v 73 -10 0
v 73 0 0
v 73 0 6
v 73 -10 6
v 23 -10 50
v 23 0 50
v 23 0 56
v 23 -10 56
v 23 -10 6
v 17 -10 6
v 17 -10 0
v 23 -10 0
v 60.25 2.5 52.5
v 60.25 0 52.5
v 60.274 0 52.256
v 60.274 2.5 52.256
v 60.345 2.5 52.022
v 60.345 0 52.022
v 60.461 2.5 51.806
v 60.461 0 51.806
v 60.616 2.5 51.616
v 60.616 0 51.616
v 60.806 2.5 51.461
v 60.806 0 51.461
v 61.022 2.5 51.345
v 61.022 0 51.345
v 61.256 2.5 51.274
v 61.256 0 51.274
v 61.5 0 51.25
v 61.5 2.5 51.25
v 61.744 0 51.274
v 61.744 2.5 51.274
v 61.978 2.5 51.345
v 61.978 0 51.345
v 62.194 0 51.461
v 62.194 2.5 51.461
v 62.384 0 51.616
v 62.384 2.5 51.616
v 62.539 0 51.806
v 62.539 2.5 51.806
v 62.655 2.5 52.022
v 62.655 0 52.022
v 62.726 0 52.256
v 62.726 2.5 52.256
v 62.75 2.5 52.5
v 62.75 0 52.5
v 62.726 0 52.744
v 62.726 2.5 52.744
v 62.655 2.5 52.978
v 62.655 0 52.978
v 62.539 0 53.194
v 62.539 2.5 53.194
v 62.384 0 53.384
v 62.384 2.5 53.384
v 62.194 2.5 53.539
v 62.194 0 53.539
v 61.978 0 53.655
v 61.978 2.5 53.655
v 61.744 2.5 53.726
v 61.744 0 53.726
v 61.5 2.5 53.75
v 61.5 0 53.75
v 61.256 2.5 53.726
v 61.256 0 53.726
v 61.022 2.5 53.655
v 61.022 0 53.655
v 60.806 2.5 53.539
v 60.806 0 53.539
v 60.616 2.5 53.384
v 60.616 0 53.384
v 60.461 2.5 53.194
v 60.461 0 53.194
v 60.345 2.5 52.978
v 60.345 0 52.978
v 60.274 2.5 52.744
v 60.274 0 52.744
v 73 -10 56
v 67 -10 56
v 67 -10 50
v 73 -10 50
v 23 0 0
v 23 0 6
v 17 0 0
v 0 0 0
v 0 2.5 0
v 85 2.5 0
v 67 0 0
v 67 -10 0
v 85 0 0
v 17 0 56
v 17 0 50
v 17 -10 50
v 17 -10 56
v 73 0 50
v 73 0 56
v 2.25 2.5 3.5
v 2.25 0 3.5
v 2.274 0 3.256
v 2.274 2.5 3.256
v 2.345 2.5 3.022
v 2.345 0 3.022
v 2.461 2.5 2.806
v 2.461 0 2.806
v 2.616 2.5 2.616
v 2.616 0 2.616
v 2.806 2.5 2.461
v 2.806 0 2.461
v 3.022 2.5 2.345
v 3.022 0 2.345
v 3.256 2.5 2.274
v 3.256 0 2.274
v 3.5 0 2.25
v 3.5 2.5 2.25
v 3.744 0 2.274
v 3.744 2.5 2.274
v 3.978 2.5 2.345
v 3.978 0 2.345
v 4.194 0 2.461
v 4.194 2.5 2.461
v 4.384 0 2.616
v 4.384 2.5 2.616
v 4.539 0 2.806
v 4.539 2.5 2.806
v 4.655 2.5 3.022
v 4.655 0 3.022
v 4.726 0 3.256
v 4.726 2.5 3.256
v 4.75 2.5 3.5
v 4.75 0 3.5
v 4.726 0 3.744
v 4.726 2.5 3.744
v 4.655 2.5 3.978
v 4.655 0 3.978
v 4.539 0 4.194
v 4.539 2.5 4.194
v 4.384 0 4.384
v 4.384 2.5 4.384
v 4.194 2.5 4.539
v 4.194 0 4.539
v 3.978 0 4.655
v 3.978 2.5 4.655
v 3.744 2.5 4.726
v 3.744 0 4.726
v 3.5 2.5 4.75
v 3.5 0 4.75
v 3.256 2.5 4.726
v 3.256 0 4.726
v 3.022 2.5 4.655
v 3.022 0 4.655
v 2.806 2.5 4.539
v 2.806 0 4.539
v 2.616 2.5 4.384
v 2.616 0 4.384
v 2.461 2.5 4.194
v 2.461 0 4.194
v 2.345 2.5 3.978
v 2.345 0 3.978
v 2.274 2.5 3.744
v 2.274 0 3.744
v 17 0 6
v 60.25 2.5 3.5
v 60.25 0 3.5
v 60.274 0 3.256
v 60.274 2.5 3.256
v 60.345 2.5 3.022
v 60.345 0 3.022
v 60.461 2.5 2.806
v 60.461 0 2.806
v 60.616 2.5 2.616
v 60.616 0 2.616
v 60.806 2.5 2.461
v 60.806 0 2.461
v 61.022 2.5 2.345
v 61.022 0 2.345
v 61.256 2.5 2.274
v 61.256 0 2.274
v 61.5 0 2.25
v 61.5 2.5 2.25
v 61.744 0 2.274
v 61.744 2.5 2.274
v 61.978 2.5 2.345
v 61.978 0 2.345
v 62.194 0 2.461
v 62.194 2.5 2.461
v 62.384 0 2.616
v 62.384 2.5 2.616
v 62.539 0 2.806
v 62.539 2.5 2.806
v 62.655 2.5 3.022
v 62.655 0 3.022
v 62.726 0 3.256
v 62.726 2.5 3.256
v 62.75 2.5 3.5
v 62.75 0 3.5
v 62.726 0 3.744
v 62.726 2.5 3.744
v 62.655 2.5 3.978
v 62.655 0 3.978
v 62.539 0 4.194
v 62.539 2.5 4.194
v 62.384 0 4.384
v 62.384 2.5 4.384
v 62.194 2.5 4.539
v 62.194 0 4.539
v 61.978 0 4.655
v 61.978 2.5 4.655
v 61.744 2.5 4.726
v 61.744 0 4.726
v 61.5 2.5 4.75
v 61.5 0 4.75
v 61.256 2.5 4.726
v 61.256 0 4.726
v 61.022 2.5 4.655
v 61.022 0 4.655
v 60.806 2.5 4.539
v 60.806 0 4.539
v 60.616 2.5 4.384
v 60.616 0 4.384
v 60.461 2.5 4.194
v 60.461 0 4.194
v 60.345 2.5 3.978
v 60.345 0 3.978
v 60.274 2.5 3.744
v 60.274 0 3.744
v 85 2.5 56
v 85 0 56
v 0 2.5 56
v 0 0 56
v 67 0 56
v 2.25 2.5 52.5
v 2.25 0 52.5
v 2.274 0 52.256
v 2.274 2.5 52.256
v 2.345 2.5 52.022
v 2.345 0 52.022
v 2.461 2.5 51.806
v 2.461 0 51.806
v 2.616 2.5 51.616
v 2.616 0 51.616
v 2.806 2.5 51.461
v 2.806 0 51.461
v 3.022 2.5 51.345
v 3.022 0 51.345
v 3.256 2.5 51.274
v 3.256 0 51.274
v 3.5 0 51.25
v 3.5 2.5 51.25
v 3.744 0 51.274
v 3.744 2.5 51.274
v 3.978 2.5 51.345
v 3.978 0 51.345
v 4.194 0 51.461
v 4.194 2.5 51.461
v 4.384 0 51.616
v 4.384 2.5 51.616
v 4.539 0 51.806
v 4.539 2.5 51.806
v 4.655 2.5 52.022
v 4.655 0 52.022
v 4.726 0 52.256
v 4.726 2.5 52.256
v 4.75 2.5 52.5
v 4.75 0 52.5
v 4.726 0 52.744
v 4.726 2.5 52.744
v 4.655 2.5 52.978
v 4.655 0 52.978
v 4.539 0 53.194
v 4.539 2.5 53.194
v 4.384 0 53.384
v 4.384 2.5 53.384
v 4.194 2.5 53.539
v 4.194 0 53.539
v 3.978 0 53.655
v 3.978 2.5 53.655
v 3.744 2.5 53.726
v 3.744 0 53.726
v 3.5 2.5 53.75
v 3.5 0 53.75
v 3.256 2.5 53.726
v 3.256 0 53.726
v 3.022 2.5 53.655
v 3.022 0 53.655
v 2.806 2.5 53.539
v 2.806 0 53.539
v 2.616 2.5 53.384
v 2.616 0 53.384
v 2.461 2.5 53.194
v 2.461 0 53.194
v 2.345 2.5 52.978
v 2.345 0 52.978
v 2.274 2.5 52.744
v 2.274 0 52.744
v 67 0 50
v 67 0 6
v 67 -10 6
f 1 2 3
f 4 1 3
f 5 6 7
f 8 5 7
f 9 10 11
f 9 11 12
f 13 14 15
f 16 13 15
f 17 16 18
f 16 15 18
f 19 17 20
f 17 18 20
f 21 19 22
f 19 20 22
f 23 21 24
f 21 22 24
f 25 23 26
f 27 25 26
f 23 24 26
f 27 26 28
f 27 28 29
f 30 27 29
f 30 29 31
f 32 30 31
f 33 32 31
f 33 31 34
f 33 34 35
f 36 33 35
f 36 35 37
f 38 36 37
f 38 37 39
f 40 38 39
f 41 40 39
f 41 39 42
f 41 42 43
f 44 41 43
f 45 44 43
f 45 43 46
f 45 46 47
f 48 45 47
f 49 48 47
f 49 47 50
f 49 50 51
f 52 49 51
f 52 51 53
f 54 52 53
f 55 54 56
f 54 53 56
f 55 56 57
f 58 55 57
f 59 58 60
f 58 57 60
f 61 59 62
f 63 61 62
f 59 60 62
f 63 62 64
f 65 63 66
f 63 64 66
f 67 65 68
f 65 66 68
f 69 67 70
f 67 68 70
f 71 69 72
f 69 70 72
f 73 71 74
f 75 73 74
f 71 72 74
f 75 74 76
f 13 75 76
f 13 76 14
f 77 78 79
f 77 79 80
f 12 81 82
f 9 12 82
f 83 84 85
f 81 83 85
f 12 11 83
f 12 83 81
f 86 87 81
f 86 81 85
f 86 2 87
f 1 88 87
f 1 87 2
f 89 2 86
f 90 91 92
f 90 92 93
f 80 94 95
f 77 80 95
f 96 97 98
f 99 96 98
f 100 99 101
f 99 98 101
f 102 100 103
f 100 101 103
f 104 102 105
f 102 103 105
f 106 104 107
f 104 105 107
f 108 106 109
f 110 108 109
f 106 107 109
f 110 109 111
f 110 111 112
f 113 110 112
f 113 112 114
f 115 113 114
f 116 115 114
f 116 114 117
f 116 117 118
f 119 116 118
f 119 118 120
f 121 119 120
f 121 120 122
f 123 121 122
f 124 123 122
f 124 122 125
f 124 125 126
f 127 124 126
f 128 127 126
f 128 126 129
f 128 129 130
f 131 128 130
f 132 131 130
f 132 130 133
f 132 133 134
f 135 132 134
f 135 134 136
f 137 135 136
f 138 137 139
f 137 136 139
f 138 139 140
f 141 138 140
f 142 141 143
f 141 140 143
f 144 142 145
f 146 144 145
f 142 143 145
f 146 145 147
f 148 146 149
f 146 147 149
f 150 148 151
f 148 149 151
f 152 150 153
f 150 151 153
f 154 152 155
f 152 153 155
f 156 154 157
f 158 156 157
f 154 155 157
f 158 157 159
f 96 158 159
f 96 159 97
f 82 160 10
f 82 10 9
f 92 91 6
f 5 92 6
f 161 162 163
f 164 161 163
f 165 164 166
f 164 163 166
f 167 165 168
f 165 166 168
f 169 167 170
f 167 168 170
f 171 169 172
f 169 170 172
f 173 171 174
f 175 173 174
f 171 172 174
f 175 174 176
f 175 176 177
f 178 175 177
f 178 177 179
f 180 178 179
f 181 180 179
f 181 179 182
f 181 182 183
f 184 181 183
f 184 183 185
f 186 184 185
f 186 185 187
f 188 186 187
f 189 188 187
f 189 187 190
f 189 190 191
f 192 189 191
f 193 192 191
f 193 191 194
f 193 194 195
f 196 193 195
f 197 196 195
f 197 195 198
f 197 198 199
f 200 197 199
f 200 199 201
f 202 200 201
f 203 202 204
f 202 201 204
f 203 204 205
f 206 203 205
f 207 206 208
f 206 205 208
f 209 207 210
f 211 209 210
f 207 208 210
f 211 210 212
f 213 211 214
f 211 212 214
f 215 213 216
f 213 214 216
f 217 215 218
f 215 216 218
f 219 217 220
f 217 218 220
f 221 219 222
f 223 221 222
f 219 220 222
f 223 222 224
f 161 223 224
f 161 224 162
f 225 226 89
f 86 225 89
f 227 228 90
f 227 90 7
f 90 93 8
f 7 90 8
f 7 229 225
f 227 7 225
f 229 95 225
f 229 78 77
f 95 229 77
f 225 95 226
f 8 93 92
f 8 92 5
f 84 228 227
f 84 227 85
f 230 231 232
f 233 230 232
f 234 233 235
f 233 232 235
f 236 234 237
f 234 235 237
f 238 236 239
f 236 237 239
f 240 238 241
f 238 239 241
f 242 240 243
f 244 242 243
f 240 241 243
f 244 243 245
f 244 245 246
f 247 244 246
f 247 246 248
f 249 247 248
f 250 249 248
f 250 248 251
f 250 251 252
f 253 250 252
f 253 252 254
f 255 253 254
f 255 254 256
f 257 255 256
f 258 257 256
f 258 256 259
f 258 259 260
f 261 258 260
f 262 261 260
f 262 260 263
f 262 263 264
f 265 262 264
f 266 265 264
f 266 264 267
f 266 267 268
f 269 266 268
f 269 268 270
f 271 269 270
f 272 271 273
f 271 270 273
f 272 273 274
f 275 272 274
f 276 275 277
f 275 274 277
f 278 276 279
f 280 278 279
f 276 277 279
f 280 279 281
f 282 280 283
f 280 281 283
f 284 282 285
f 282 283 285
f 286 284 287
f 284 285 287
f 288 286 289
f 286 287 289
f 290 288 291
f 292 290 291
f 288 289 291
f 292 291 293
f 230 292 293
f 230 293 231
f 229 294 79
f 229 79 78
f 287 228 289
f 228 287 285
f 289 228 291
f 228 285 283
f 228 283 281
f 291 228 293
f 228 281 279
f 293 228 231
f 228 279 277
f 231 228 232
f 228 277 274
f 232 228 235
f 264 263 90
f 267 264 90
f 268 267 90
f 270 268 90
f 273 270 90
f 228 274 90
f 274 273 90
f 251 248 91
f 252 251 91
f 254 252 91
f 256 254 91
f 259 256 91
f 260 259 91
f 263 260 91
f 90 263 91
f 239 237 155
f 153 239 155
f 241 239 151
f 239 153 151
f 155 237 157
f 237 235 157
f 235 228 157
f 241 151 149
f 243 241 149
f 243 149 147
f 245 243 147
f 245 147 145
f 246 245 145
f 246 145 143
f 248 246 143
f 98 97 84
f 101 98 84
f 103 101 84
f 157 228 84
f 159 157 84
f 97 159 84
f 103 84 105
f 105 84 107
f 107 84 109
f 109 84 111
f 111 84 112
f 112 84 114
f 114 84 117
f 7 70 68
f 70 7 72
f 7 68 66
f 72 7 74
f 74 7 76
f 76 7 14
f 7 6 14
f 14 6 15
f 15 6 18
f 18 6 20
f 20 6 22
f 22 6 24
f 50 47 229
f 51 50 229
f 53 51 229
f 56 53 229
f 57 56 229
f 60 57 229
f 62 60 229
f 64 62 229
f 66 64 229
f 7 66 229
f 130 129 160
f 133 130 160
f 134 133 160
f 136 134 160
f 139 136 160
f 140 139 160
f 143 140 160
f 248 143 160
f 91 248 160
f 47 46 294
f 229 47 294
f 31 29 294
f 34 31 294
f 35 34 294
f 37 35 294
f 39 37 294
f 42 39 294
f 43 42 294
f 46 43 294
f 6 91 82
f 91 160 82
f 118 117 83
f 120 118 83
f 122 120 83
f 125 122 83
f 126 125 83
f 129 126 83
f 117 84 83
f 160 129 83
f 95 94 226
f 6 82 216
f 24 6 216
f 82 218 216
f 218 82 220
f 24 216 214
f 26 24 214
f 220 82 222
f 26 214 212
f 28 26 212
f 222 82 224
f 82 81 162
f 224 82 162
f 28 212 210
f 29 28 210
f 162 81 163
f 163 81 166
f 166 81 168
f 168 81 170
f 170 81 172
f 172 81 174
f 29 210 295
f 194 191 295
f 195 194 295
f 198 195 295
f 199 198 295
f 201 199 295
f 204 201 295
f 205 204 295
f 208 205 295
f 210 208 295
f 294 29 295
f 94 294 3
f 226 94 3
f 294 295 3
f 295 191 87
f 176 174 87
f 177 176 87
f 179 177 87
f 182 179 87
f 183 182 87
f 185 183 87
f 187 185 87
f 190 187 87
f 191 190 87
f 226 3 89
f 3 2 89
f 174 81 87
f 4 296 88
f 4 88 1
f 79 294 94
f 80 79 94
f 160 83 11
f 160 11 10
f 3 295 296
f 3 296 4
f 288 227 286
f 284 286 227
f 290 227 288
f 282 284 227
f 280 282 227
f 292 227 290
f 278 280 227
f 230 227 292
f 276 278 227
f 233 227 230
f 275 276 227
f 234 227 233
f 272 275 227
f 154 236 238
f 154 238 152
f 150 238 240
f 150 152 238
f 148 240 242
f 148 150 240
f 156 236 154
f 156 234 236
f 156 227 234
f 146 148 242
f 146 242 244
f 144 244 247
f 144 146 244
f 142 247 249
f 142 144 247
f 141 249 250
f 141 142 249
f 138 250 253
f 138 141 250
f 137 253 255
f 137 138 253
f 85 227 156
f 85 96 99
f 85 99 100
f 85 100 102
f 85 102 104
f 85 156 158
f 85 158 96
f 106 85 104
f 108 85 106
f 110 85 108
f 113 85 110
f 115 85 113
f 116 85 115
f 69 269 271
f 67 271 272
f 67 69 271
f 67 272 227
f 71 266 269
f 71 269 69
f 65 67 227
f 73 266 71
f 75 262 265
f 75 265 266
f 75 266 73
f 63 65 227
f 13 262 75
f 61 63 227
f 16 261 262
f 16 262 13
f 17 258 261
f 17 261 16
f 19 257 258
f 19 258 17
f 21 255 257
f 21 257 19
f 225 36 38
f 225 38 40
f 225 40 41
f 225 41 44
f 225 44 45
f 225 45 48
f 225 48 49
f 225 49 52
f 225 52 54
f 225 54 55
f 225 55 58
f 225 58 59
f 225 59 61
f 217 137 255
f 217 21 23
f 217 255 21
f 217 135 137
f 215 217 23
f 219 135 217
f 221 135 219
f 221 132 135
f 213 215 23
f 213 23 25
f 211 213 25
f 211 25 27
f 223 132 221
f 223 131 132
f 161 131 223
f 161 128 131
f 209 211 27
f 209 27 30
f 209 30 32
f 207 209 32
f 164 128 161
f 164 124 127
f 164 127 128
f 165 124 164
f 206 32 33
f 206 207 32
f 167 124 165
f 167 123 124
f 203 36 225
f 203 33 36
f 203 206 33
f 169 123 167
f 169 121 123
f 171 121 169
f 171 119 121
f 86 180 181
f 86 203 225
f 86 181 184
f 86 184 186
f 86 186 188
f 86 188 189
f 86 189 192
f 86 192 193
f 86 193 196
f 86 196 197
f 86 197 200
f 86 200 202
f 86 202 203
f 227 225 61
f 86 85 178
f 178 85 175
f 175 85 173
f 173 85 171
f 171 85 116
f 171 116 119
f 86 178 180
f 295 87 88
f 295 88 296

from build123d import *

# Parameters (mm, degrees)
SKETCH1_W                   = 85
SKETCH1_H                   = 56
BOSS_EXTRUDE1_DEPTH         = 2.5
TAP_DRILL_FOR_M3X0_5_TAP2_D = 2.5
SKETCH5_W                   = 6
SKETCH5_H                   = 6
BOSS_EXTRUDE2_DEPTH         = 10


with BuildPart() as part:
    # Sketch1 → Boss-Extrude1 (new body)
    with BuildSketch(Plane(origin=(0, 0, 0), x_dir=(1, 0, 0), z_dir=(0, 1, 0))):
        with Locations((42.5, -28)):
            Rectangle(SKETCH1_W, SKETCH1_H)
    extrude(amount=BOSS_EXTRUDE1_DEPTH)

    # Tap Drill for M3x0.5 Tap2 (through all)
    with Locations(Plane(origin=(0, 2.5, 0), x_dir=(1, 0, 0), z_dir=(0, 1, 0))):
        with Locations((3.5, -3.5), (61.5, -3.5), (61.5, -52.5), (3.5, -52.5)):
            Hole(TAP_DRILL_FOR_M3X0_5_TAP2_D / 2)

    # Sketch5 → Boss-Extrude2 (add)
    with BuildSketch(Plane.XZ):
        with Locations((20, 3)):
            Rectangle(SKETCH5_W, SKETCH5_H)
        with Locations((20, 53)):
            Rectangle(SKETCH5_W, SKETCH5_H)
        with Locations((70, 3)):
            Rectangle(SKETCH5_W, SKETCH5_H)
        with Locations((70, 53)):
            Rectangle(SKETCH5_W, SKETCH5_H)
    extrude(amount=BOSS_EXTRUDE2_DEPTH)


solid = part.part
